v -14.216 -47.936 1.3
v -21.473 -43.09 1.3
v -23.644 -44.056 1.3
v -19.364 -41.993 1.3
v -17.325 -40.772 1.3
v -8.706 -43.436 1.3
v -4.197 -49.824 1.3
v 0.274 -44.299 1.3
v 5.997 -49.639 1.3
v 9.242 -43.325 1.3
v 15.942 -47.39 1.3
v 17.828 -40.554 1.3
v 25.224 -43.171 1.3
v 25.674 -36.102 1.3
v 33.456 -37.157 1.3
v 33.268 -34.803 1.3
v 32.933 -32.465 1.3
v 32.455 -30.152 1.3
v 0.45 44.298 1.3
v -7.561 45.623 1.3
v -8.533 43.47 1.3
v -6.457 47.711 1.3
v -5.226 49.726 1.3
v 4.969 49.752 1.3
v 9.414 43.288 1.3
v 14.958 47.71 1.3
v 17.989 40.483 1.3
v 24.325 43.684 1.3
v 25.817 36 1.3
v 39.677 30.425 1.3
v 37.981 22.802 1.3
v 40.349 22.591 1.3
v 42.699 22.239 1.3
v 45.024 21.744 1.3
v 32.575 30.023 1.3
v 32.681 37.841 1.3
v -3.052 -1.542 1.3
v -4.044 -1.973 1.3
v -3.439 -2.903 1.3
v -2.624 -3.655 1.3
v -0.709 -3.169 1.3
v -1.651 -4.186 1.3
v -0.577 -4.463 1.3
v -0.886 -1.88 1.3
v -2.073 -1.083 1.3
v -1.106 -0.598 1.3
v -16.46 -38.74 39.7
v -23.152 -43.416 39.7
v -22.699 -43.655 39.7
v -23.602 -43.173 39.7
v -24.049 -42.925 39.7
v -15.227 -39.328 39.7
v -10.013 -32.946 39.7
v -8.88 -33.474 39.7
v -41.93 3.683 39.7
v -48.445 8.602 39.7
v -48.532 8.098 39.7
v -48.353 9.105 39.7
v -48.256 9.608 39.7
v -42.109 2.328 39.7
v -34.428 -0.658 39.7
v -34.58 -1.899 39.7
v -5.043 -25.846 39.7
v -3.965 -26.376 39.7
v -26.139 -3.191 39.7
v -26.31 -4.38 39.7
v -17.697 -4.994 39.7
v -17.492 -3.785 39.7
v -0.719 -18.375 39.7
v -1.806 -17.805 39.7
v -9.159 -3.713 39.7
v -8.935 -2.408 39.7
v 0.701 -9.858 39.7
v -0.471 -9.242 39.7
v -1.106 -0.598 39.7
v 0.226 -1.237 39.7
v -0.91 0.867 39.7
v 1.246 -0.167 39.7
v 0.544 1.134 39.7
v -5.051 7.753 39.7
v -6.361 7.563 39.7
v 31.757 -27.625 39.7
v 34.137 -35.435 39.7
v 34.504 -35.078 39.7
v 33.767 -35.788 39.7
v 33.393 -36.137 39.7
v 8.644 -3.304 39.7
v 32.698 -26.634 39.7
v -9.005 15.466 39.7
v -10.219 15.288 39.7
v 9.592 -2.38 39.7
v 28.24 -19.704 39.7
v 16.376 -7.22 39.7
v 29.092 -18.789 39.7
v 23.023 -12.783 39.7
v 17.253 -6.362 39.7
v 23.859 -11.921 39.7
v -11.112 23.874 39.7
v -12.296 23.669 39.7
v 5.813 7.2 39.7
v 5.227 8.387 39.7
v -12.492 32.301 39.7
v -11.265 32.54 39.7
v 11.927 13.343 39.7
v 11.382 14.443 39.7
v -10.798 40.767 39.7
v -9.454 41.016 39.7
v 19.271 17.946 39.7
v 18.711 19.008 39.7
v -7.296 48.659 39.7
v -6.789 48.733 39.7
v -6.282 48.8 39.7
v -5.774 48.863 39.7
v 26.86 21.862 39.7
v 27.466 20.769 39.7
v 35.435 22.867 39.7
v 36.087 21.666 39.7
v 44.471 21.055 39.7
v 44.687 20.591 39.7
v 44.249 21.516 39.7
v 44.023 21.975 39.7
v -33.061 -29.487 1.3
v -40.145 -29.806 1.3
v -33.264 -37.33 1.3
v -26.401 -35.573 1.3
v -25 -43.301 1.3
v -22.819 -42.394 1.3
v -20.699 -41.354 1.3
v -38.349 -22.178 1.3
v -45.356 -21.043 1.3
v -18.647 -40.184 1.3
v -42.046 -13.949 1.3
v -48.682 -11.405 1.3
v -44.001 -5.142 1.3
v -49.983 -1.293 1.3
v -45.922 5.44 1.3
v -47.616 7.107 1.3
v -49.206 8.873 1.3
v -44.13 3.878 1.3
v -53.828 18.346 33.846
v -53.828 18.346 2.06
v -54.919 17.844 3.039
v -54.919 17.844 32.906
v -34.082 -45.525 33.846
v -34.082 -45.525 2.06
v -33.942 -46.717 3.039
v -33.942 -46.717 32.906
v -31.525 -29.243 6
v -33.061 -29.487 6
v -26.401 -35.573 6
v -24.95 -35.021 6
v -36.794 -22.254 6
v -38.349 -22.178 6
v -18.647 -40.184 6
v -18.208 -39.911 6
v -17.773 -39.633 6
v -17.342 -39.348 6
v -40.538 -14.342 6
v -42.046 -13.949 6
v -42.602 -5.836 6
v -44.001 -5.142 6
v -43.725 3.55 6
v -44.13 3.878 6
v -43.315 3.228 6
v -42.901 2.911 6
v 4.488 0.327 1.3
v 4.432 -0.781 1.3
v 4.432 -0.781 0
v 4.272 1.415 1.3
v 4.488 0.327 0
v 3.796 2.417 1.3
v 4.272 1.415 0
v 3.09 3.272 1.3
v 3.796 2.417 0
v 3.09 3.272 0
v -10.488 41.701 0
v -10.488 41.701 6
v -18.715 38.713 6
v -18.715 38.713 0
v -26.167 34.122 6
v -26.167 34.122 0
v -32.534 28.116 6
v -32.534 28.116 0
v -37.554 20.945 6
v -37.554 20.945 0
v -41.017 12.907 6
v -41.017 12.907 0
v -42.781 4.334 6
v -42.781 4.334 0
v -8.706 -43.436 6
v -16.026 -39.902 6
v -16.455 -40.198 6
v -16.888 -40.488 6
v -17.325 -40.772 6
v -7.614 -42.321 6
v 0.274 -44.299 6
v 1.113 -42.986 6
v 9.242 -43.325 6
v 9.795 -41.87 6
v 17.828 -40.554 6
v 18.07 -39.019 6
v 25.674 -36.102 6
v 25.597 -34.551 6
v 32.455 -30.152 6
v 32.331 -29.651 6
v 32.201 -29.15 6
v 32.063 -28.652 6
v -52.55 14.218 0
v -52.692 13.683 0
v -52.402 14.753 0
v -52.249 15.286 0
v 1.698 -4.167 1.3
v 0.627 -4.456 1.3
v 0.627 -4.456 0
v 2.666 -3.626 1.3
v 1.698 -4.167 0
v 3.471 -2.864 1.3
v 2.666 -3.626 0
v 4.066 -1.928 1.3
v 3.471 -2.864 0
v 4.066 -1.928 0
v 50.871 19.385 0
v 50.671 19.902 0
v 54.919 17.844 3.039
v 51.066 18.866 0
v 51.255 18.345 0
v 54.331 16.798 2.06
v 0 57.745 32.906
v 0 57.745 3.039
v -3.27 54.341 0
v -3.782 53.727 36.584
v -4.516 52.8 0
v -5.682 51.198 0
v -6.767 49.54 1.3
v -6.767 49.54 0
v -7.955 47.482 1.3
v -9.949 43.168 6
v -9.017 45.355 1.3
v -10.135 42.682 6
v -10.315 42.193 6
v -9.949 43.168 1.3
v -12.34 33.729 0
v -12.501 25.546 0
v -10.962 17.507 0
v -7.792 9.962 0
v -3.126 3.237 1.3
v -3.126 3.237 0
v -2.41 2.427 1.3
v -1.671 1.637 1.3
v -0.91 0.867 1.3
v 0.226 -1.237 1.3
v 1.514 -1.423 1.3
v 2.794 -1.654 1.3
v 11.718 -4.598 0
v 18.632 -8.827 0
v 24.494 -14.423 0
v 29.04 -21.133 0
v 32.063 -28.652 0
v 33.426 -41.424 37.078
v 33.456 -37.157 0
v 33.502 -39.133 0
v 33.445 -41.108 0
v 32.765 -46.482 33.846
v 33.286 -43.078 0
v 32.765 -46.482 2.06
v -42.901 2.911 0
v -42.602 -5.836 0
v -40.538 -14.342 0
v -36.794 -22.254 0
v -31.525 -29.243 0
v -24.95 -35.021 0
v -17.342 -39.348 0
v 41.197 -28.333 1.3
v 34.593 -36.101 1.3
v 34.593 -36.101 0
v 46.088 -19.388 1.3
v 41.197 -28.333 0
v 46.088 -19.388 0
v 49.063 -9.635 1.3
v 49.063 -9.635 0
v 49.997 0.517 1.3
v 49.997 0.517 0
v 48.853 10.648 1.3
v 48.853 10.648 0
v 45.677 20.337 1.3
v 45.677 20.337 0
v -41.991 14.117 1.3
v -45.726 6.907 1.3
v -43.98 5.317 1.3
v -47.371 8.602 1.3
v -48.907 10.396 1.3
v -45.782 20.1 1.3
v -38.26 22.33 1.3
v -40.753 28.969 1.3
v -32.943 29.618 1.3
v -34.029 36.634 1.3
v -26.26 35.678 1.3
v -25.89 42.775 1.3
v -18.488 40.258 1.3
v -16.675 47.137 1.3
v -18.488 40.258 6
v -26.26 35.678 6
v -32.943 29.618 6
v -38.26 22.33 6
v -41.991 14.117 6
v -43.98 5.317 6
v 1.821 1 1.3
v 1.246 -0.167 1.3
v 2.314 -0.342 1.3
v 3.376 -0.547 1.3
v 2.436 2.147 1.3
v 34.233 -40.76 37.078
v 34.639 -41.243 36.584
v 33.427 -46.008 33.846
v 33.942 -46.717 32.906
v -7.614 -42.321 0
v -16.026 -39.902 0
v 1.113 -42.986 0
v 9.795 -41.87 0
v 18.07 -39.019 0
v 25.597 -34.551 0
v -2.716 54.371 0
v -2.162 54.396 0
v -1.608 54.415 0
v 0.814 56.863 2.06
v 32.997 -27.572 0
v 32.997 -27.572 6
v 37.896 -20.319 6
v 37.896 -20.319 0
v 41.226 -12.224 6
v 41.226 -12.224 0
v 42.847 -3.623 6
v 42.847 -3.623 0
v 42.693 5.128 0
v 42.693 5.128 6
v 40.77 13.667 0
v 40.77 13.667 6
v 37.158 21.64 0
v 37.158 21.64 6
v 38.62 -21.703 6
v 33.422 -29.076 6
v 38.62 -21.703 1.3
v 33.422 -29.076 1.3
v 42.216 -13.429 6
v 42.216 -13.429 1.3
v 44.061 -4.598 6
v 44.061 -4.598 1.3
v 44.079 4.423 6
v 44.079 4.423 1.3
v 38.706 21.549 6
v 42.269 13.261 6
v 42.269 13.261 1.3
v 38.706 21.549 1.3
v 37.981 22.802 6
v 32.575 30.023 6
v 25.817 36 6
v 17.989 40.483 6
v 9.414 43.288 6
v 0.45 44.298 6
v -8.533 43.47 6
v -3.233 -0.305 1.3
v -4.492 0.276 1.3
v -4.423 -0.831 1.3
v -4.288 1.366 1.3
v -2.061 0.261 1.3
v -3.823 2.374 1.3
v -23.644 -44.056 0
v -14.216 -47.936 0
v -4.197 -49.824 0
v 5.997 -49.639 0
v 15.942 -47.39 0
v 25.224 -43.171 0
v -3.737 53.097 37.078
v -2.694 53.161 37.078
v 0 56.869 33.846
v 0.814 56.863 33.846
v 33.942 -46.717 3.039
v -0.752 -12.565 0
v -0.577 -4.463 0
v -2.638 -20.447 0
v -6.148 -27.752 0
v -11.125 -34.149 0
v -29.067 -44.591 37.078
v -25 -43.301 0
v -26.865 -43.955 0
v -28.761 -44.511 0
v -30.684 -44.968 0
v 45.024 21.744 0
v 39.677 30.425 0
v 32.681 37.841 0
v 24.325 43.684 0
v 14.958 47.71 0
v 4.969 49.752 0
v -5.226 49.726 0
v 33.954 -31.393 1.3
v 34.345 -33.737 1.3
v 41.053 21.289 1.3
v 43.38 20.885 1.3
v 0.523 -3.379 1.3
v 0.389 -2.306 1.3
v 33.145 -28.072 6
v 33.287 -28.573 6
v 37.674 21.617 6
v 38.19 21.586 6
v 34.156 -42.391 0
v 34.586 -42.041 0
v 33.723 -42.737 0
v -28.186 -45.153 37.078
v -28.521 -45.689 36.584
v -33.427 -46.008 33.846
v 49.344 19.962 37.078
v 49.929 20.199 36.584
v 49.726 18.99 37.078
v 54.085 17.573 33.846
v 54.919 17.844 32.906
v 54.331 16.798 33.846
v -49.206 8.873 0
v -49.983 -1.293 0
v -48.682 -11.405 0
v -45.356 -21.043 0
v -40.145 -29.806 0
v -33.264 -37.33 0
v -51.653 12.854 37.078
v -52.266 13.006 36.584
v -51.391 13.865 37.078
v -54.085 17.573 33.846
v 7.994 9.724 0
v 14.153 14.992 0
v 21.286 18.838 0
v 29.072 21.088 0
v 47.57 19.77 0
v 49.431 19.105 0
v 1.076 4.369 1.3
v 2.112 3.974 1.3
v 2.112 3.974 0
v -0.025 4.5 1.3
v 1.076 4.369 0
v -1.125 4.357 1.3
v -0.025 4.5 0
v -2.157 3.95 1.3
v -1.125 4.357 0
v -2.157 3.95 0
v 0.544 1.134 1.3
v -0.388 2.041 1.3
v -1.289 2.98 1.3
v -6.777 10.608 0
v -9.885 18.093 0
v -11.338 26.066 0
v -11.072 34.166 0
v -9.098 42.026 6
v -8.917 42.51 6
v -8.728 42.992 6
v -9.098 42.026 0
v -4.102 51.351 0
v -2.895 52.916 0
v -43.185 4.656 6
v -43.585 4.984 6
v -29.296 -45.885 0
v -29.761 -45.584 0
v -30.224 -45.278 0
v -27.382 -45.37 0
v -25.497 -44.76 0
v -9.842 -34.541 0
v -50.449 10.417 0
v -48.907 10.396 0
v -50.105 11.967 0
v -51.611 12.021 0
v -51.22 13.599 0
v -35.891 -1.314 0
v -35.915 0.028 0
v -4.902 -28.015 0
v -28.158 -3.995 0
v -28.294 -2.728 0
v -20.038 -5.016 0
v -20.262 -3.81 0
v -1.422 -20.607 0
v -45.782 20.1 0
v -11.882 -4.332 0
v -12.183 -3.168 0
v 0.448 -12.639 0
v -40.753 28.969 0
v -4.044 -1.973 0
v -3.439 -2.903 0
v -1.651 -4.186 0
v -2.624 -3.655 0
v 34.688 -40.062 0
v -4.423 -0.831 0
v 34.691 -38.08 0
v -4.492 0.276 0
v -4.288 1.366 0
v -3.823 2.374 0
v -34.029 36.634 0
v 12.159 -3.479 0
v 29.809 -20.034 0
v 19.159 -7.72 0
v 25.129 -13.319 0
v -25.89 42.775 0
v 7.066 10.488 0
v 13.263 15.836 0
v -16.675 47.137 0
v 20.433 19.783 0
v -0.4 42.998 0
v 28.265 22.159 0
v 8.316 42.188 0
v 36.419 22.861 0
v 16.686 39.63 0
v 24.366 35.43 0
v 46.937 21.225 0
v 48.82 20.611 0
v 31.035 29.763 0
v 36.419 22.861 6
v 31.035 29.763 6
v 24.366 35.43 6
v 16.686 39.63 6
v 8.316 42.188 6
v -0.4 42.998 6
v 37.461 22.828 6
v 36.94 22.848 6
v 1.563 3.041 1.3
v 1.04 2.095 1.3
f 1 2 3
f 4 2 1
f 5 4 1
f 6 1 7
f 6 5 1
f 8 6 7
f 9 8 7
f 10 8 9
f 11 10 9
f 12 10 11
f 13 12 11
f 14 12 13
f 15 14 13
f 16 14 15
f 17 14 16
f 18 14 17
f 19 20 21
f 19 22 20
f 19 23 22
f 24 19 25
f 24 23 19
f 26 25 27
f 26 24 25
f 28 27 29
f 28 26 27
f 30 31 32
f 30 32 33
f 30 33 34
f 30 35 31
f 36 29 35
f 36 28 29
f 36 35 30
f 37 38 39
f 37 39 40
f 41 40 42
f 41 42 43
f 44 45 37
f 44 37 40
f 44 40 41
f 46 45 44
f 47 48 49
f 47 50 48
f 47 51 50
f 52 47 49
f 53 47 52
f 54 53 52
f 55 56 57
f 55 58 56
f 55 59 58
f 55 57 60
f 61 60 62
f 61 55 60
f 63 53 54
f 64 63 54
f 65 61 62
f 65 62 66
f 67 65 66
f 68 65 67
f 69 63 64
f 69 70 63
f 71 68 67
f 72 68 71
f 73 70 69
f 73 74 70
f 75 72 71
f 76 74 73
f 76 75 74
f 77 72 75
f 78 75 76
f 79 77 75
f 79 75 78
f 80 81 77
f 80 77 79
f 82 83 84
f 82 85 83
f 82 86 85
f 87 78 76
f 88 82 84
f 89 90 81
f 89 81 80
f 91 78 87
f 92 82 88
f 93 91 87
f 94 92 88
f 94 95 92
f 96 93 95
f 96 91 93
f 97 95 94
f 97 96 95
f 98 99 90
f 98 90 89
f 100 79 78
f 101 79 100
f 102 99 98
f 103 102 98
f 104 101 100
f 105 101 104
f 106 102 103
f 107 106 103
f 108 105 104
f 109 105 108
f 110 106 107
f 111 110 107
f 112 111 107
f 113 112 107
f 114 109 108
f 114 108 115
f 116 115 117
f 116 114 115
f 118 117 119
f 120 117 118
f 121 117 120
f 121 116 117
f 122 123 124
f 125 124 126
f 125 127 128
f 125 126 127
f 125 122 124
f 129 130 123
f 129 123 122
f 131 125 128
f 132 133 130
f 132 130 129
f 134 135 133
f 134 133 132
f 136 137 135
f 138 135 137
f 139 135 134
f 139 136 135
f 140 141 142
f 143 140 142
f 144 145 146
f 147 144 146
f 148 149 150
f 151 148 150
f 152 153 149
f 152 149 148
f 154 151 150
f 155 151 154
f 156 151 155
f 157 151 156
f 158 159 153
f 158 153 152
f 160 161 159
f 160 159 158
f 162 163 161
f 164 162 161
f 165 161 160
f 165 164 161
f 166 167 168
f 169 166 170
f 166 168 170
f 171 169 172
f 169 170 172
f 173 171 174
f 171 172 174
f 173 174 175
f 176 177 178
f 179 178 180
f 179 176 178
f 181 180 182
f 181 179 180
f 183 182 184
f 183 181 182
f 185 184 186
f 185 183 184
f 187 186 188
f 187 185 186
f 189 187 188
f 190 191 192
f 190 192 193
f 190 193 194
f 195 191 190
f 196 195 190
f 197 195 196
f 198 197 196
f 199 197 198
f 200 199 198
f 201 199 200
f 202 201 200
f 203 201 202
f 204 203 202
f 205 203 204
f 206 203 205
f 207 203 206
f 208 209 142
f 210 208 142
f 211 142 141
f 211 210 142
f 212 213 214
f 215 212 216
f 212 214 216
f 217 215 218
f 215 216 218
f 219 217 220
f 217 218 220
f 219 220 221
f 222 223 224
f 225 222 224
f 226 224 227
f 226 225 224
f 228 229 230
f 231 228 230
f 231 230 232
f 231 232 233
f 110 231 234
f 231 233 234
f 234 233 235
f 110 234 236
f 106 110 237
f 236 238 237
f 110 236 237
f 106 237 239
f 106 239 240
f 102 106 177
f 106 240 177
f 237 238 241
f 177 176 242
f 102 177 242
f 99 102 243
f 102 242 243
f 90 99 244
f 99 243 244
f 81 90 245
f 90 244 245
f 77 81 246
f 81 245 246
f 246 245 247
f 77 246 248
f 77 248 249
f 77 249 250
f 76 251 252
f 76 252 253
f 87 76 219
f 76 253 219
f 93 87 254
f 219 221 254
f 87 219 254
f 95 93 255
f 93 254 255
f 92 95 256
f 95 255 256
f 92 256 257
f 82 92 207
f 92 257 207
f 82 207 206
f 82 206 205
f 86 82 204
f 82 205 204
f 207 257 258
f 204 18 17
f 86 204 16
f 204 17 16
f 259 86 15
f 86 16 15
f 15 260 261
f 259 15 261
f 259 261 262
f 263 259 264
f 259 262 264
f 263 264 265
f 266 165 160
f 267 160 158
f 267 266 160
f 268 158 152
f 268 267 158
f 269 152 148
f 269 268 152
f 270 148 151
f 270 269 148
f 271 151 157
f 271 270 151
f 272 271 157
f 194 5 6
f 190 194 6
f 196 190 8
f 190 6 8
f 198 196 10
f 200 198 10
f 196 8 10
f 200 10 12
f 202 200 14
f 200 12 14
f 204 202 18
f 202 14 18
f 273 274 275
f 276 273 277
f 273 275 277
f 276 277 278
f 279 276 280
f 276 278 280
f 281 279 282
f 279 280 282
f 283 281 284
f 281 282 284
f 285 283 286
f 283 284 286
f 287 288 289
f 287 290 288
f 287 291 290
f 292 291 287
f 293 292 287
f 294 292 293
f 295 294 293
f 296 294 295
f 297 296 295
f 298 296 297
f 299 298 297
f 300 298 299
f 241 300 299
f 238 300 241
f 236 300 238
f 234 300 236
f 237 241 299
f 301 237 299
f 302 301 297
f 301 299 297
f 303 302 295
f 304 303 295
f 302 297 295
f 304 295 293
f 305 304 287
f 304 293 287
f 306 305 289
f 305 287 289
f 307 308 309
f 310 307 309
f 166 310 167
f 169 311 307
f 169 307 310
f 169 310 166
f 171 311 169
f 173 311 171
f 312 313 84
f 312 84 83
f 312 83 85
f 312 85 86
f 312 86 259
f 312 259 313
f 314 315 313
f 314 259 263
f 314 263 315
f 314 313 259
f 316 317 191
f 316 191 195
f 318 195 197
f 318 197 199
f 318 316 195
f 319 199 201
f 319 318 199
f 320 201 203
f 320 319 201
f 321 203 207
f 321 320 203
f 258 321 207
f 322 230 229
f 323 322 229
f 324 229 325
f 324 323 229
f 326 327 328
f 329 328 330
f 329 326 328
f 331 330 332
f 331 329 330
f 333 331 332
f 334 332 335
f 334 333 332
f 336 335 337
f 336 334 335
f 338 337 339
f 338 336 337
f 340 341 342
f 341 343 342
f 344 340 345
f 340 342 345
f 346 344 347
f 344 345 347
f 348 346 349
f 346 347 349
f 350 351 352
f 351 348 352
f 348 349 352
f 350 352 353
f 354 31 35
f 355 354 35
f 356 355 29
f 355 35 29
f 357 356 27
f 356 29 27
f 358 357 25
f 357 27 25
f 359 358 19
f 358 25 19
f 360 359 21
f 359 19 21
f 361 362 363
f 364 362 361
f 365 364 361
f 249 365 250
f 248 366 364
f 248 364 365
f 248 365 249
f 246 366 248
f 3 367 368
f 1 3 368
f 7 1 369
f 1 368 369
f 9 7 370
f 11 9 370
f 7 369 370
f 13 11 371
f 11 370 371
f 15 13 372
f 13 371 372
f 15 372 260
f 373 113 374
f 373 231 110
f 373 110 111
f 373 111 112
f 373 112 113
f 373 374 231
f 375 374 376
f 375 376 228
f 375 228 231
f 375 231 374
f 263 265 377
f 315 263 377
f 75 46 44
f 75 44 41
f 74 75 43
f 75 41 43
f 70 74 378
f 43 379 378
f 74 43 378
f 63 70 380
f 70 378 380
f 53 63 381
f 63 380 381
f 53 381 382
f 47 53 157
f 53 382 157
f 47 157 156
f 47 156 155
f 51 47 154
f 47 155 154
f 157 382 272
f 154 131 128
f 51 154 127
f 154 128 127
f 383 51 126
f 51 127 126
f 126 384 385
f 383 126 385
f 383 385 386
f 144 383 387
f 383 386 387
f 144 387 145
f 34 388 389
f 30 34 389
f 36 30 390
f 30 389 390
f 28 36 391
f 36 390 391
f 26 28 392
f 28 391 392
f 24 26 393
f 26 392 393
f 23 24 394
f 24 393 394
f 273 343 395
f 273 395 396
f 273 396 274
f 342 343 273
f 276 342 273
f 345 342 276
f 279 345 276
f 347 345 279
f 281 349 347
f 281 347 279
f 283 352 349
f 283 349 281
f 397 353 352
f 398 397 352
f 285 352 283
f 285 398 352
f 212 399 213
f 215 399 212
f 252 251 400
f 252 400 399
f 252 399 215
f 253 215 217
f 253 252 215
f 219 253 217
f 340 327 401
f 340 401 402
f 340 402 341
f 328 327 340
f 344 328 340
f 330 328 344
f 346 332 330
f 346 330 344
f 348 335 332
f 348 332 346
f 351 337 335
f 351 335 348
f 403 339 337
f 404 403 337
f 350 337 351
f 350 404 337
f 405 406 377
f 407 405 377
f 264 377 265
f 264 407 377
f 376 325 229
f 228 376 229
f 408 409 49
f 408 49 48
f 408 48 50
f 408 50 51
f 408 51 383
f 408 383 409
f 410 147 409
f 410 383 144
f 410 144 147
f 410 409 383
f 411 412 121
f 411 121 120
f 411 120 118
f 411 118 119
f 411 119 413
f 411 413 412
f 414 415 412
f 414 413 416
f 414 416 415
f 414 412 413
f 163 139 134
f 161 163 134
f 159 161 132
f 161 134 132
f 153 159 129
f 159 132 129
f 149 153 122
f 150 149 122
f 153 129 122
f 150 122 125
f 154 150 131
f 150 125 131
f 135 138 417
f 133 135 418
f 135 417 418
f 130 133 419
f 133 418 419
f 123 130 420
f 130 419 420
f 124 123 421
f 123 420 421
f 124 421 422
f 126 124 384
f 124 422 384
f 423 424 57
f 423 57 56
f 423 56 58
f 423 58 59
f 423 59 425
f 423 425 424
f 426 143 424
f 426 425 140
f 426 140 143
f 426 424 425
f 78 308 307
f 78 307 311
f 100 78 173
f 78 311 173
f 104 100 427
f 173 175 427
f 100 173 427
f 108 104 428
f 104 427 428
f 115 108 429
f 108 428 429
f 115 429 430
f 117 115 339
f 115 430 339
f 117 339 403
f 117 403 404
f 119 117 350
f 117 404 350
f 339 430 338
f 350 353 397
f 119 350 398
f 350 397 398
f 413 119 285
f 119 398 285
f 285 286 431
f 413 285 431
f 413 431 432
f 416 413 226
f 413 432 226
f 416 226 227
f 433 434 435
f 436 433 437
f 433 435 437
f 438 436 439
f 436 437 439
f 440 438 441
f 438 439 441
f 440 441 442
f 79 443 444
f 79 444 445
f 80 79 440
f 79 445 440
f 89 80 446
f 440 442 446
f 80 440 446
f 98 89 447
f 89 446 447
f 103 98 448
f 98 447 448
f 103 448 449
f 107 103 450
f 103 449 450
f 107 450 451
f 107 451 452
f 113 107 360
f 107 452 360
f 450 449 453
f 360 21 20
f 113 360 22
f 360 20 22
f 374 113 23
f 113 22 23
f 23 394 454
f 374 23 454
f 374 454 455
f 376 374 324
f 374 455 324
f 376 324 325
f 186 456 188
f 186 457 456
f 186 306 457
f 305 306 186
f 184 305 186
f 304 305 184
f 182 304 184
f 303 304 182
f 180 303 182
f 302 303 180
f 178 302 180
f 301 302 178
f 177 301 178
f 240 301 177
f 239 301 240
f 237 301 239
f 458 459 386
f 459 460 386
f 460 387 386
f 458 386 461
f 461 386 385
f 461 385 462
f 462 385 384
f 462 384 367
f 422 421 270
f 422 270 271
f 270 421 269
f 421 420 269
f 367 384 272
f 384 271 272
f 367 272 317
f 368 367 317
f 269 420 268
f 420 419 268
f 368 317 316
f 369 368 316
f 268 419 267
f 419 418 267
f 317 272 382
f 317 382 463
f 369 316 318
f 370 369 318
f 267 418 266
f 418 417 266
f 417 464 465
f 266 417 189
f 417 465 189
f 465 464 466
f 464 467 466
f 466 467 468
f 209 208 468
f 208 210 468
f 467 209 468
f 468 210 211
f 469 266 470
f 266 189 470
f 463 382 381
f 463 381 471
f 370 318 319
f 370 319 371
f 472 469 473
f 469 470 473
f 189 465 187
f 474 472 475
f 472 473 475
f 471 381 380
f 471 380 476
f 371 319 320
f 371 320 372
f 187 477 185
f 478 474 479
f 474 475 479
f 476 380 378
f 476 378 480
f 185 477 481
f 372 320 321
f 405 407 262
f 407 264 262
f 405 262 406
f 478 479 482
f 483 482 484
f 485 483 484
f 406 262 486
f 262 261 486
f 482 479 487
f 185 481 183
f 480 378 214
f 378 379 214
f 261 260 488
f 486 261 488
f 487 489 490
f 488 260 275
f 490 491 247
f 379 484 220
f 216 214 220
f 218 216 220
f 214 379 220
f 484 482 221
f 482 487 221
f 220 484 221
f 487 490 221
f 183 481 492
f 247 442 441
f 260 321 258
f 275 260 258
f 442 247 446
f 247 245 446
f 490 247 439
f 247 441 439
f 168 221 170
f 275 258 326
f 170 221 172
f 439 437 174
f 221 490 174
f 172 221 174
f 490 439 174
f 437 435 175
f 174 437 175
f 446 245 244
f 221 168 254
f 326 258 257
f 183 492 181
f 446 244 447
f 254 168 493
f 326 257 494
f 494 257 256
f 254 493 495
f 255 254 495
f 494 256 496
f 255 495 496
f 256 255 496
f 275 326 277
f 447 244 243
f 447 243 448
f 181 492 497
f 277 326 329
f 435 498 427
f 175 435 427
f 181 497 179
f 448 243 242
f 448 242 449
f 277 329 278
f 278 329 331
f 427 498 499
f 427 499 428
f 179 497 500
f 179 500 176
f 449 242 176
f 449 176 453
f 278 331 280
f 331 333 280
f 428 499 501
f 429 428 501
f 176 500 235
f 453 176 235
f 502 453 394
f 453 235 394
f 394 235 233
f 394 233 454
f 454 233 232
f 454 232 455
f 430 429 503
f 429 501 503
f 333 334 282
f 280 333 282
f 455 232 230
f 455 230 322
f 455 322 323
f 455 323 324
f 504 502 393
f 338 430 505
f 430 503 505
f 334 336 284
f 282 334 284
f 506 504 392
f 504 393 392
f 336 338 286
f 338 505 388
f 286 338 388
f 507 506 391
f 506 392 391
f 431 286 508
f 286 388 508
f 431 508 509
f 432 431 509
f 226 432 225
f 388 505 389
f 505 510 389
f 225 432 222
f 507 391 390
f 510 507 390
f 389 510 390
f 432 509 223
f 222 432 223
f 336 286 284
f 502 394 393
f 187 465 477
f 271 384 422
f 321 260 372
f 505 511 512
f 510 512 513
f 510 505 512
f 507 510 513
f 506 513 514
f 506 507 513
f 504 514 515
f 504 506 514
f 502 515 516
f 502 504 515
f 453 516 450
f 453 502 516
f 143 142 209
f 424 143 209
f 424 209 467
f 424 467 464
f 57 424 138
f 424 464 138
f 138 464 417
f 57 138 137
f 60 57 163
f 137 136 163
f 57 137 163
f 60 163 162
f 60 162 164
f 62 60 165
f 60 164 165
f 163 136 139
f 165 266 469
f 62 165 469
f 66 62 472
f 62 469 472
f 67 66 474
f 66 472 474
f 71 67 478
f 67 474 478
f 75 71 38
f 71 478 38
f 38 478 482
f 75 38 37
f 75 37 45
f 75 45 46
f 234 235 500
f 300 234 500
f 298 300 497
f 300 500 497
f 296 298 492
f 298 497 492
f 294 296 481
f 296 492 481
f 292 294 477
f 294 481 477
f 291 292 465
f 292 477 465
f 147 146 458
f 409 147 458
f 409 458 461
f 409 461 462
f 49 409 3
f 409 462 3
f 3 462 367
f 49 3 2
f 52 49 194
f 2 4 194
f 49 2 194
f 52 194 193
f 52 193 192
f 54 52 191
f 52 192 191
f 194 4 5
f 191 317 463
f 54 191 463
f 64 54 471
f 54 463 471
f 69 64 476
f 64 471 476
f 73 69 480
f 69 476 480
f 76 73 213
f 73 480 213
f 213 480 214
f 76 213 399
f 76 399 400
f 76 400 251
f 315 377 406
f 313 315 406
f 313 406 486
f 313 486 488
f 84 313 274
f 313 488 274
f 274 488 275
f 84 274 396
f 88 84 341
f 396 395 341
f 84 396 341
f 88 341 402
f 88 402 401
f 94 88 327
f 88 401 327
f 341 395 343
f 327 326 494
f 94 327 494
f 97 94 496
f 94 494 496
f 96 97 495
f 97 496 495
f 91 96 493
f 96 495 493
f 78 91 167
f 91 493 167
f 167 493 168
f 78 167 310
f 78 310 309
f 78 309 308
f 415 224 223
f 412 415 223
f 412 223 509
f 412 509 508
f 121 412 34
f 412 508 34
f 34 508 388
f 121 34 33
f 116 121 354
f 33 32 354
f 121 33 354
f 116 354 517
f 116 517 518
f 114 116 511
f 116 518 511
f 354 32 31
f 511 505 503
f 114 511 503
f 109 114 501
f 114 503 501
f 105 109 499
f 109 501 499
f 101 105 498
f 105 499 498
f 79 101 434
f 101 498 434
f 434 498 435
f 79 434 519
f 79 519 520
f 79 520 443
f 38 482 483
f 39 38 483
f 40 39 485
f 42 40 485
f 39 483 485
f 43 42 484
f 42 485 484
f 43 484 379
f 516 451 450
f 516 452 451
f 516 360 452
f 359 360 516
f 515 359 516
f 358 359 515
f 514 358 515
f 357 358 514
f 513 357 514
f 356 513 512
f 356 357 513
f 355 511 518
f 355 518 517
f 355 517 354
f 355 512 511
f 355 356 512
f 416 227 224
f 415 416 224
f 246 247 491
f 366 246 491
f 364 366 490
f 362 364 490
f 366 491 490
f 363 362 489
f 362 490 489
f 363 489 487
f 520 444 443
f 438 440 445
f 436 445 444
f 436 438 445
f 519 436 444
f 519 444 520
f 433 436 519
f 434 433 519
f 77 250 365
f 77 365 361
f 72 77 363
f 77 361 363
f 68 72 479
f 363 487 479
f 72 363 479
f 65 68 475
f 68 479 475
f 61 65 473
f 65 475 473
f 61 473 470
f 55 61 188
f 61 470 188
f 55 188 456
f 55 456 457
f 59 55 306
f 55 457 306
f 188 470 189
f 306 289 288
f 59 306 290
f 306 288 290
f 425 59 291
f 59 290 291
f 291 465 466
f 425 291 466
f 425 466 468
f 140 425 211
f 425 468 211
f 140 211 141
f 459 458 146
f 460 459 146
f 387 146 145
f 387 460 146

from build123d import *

# Parameters (mm, degrees)
F0_R     = 44.3
F0_R_2   = 43
F1_DEPTH = 6
F0_R_3   = 50
F2_DEPTH = 1.3
F0_R_4   = 4.5
F4_DEPTH = 39.7


with BuildPart() as f1:
    # F0 (on Top) → F1 (new body)
    with BuildSketch(Plane.XY):
        Circle(F0_R)
        Circle(F0_R_2, mode=Mode.SUBTRACT)
    extrude(amount=F1_DEPTH)

    # F0 (on Top) → F2 (join)
    with BuildSketch(Plane.XY):
        Circle(F0_R_3)
        Circle(F0_R, mode=Mode.SUBTRACT)
    extrude(amount=F2_DEPTH)



with BuildPart() as f2:
    # F0 (on Top) → F2, piece 2 (new body)
    with BuildSketch(Plane.XY):
        Circle(F0_R_4)
    extrude(amount=F2_DEPTH)


with BuildPart() as f1_1:
    add(f1.part)

    add(f2.part)  # F4 merges F2
    # F3 (on Top) → F4 (join)
    with BuildSketch(Plane.XY):
        with BuildLine():
            Line((0.813912513, 56.8630076668), (0, 57.7447935939))
            ThreePointArc((0, 57.7447935939), (-12.6366686131, 29.501028063), (-0.9101021846, 0.8674232463))
            ThreePointArc((-0.9101021846, 0.8674232463), (-0.7483916982, 0.9566019765), (-0.5871154535, 1.046563636))
            Line((-0.5871154535, 1.046563636), (0, 0))
            ThreePointArc((0, 0), (0.267331286, 0.5689785091), (0.5437314891, 1.1336071376))
            ThreePointArc((0.5437314891, 1.1336071376), (-11.4412500514, 29.057066575), (0.813912513, 56.8630076668))
        make_face()
        with BuildLine():
            ThreePointArc((-0.5871154535, 1.046563636), (-0.7483916982, 0.9566019765), (-0.9101021846, 0.8674232463))
            ThreePointArc((-0.9101021846, 0.8674232463), (-0.4585208082, 0.4300711904), (0, 0))
            Line((0, 0), (-0.5871154535, 1.046563636))
        make_face()
        with BuildLine():
            ThreePointArc((0, 0), (-0.4585208082, 0.4300711904), (-0.9101021846, 0.8674232463))
            ThreePointArc((-0.9101021846, 0.8674232463), (-31.1704532134, -1.9021480376), (-53.8284211792, 18.3457125195))
            Line((-53.8284211792, 18.3457125195), (-54.9185622296, 17.8441225572))
            ThreePointArc((-54.9185622296, 17.8441225572), (-31.9620903304, -2.9018670057), (-1.1062055724, -0.5975100887))
            ThreePointArc((-1.1062055724, -0.5975100887), (-1.1410482964, -0.4161565338), (-1.1767698186, -0.2349740286))
            Line((-1.1767698186, -0.2349740286), (0, 0))
        make_face()
        with BuildLine():
            ThreePointArc((0.5437314891, 1.1336071376), (0.267331286, 0.5689785091), (0, 0))
            Line((0, 0), (0.813912513, 0.8817859271))
            ThreePointArc((0.813912513, 0.8817859271), (0.67851679, 1.0073690689), (0.5437314891, 1.1336071376))
        make_face()
        with BuildLine():
            Line((-0.1401682913, -1.1917855722), (0, 0))
            ThreePointArc((0, 0), (-0.5507127301, -0.3031798959), (-1.1062055724, -0.5975100887))
            ThreePointArc((-1.1062055724, -0.5975100887), (-7.8231494792, -30.2326587139), (-34.0817063625, -45.5247337819))
            Line((-34.0817063625, -45.5247337819), (-33.9415380712, -46.7165193541))
            ThreePointArc((-33.9415380712, -46.7165193541), (-7.1169895626, -31.2944805034), (0.2264295423, -1.2367047898))
            ThreePointArc((0.2264295423, -1.2367047898), (0.0431850682, -1.213800859), (-0.1401682913, -1.1917855722))
        make_face()
        with BuildLine():
            Line((1.0901410504, -0.5015899623), (0, 0))
            ThreePointArc((0, 0), (0.118161623, -0.6174466707), (0.2264295423, -1.2367047898))
            ThreePointArc((0.2264295423, -1.2367047898), (26.3354809362, -16.7826626179), (32.7647682526, -46.4815453255))
            Line((32.7647682526, -46.4815453255), (33.9415380712, -46.7165193541))
            ThreePointArc((33.9415380712, -46.7165193541), (27.5635488832, -16.4391856056), (1.2461467256, -0.1668155054))
            ThreePointArc((1.2461467256, -0.1668155054), (1.1677381364, -0.3340136527), (1.0901410504, -0.5015899623))
        make_face()
        with BuildLine():
            ThreePointArc((-1.1062055724, -0.5975100887), (-0.5507127301, -0.3031798959), (0, 0))
            Line((0, 0), (-1.1767698186, -0.2349740286))
            ThreePointArc((-1.1767698186, -0.2349740286), (-1.1410482964, -0.4161565338), (-1.1062055724, -0.5975100887))
        make_face()
        with BuildLine():
            Line((0.813912513, 0.8817859271), (0, 0))
            ThreePointArc((0, 0), (0.6237406292, -0.0784231329), (1.2461467256, -0.1668155054))
            ThreePointArc((1.2461467256, -0.1668155054), (24.0993718078, 19.8604027943), (54.3314467761, 16.7975589211))
            Line((54.3314467761, 16.7975589211), (54.9185622296, 17.8441225572))
            ThreePointArc((54.9185622296, 17.8441225572), (24.152199623, 21.1345050517), (0.5437314891, 1.1336071376))
            ThreePointArc((0.5437314891, 1.1336071376), (0.67851679, 1.0073690689), (0.813912513, 0.8817859271))
        make_face()
        with BuildLine():
            ThreePointArc((0.2264295423, -1.2367047898), (0.118161623, -0.6174466707), (0, 0))
            Line((0, 0), (-0.1401682913, -1.1917855722))
            ThreePointArc((-0.1401682913, -1.1917855722), (0.0431850682, -1.213800859), (0.2264295423, -1.2367047898))
        make_face()
        with BuildLine():
            ThreePointArc((1.2461467256, -0.1668155054), (0.6237406292, -0.0784231329), (0, 0))
            Line((0, 0), (1.0901410504, -0.5015899623))
            ThreePointArc((1.0901410504, -0.5015899623), (1.1677381364, -0.3340136527), (1.2461467256, -0.1668155054))
        make_face()
    extrude(amount=F4_DEPTH)

    # F5 (on Right) → F6 (revolve, cut)
    with BuildSketch(Plane.YZ):
        with BuildLine():
            Line((64.435094595, 43.7389037002), (33.4996059537, 43.7389037002))
            ThreePointArc((33.4996059537, 43.7389037002), (52.6054366049, 37.5412075606), (64.435094595, 21.3084199335))
            Line((64.435094595, 21.3084199335), (64.435094595, 43.7389037002))
        make_face()
        with BuildLine():
            ThreePointArc((61.4731870592, 13.4233012795), (57.7598621582, 3.0573466208), (48.3091473579, -2.5929443073))
            Line((48.3091473579, -2.5929443073), (61.4731870592, -2.5929443073))
            Line((61.4731870592, -2.5929443073), (61.4731870592, 13.4233012795))
        make_face()
    revolve(axis=Axis((0, 0, 0), (0, 0, -1)), mode=Mode.SUBTRACT)


solid = f1_1.part
